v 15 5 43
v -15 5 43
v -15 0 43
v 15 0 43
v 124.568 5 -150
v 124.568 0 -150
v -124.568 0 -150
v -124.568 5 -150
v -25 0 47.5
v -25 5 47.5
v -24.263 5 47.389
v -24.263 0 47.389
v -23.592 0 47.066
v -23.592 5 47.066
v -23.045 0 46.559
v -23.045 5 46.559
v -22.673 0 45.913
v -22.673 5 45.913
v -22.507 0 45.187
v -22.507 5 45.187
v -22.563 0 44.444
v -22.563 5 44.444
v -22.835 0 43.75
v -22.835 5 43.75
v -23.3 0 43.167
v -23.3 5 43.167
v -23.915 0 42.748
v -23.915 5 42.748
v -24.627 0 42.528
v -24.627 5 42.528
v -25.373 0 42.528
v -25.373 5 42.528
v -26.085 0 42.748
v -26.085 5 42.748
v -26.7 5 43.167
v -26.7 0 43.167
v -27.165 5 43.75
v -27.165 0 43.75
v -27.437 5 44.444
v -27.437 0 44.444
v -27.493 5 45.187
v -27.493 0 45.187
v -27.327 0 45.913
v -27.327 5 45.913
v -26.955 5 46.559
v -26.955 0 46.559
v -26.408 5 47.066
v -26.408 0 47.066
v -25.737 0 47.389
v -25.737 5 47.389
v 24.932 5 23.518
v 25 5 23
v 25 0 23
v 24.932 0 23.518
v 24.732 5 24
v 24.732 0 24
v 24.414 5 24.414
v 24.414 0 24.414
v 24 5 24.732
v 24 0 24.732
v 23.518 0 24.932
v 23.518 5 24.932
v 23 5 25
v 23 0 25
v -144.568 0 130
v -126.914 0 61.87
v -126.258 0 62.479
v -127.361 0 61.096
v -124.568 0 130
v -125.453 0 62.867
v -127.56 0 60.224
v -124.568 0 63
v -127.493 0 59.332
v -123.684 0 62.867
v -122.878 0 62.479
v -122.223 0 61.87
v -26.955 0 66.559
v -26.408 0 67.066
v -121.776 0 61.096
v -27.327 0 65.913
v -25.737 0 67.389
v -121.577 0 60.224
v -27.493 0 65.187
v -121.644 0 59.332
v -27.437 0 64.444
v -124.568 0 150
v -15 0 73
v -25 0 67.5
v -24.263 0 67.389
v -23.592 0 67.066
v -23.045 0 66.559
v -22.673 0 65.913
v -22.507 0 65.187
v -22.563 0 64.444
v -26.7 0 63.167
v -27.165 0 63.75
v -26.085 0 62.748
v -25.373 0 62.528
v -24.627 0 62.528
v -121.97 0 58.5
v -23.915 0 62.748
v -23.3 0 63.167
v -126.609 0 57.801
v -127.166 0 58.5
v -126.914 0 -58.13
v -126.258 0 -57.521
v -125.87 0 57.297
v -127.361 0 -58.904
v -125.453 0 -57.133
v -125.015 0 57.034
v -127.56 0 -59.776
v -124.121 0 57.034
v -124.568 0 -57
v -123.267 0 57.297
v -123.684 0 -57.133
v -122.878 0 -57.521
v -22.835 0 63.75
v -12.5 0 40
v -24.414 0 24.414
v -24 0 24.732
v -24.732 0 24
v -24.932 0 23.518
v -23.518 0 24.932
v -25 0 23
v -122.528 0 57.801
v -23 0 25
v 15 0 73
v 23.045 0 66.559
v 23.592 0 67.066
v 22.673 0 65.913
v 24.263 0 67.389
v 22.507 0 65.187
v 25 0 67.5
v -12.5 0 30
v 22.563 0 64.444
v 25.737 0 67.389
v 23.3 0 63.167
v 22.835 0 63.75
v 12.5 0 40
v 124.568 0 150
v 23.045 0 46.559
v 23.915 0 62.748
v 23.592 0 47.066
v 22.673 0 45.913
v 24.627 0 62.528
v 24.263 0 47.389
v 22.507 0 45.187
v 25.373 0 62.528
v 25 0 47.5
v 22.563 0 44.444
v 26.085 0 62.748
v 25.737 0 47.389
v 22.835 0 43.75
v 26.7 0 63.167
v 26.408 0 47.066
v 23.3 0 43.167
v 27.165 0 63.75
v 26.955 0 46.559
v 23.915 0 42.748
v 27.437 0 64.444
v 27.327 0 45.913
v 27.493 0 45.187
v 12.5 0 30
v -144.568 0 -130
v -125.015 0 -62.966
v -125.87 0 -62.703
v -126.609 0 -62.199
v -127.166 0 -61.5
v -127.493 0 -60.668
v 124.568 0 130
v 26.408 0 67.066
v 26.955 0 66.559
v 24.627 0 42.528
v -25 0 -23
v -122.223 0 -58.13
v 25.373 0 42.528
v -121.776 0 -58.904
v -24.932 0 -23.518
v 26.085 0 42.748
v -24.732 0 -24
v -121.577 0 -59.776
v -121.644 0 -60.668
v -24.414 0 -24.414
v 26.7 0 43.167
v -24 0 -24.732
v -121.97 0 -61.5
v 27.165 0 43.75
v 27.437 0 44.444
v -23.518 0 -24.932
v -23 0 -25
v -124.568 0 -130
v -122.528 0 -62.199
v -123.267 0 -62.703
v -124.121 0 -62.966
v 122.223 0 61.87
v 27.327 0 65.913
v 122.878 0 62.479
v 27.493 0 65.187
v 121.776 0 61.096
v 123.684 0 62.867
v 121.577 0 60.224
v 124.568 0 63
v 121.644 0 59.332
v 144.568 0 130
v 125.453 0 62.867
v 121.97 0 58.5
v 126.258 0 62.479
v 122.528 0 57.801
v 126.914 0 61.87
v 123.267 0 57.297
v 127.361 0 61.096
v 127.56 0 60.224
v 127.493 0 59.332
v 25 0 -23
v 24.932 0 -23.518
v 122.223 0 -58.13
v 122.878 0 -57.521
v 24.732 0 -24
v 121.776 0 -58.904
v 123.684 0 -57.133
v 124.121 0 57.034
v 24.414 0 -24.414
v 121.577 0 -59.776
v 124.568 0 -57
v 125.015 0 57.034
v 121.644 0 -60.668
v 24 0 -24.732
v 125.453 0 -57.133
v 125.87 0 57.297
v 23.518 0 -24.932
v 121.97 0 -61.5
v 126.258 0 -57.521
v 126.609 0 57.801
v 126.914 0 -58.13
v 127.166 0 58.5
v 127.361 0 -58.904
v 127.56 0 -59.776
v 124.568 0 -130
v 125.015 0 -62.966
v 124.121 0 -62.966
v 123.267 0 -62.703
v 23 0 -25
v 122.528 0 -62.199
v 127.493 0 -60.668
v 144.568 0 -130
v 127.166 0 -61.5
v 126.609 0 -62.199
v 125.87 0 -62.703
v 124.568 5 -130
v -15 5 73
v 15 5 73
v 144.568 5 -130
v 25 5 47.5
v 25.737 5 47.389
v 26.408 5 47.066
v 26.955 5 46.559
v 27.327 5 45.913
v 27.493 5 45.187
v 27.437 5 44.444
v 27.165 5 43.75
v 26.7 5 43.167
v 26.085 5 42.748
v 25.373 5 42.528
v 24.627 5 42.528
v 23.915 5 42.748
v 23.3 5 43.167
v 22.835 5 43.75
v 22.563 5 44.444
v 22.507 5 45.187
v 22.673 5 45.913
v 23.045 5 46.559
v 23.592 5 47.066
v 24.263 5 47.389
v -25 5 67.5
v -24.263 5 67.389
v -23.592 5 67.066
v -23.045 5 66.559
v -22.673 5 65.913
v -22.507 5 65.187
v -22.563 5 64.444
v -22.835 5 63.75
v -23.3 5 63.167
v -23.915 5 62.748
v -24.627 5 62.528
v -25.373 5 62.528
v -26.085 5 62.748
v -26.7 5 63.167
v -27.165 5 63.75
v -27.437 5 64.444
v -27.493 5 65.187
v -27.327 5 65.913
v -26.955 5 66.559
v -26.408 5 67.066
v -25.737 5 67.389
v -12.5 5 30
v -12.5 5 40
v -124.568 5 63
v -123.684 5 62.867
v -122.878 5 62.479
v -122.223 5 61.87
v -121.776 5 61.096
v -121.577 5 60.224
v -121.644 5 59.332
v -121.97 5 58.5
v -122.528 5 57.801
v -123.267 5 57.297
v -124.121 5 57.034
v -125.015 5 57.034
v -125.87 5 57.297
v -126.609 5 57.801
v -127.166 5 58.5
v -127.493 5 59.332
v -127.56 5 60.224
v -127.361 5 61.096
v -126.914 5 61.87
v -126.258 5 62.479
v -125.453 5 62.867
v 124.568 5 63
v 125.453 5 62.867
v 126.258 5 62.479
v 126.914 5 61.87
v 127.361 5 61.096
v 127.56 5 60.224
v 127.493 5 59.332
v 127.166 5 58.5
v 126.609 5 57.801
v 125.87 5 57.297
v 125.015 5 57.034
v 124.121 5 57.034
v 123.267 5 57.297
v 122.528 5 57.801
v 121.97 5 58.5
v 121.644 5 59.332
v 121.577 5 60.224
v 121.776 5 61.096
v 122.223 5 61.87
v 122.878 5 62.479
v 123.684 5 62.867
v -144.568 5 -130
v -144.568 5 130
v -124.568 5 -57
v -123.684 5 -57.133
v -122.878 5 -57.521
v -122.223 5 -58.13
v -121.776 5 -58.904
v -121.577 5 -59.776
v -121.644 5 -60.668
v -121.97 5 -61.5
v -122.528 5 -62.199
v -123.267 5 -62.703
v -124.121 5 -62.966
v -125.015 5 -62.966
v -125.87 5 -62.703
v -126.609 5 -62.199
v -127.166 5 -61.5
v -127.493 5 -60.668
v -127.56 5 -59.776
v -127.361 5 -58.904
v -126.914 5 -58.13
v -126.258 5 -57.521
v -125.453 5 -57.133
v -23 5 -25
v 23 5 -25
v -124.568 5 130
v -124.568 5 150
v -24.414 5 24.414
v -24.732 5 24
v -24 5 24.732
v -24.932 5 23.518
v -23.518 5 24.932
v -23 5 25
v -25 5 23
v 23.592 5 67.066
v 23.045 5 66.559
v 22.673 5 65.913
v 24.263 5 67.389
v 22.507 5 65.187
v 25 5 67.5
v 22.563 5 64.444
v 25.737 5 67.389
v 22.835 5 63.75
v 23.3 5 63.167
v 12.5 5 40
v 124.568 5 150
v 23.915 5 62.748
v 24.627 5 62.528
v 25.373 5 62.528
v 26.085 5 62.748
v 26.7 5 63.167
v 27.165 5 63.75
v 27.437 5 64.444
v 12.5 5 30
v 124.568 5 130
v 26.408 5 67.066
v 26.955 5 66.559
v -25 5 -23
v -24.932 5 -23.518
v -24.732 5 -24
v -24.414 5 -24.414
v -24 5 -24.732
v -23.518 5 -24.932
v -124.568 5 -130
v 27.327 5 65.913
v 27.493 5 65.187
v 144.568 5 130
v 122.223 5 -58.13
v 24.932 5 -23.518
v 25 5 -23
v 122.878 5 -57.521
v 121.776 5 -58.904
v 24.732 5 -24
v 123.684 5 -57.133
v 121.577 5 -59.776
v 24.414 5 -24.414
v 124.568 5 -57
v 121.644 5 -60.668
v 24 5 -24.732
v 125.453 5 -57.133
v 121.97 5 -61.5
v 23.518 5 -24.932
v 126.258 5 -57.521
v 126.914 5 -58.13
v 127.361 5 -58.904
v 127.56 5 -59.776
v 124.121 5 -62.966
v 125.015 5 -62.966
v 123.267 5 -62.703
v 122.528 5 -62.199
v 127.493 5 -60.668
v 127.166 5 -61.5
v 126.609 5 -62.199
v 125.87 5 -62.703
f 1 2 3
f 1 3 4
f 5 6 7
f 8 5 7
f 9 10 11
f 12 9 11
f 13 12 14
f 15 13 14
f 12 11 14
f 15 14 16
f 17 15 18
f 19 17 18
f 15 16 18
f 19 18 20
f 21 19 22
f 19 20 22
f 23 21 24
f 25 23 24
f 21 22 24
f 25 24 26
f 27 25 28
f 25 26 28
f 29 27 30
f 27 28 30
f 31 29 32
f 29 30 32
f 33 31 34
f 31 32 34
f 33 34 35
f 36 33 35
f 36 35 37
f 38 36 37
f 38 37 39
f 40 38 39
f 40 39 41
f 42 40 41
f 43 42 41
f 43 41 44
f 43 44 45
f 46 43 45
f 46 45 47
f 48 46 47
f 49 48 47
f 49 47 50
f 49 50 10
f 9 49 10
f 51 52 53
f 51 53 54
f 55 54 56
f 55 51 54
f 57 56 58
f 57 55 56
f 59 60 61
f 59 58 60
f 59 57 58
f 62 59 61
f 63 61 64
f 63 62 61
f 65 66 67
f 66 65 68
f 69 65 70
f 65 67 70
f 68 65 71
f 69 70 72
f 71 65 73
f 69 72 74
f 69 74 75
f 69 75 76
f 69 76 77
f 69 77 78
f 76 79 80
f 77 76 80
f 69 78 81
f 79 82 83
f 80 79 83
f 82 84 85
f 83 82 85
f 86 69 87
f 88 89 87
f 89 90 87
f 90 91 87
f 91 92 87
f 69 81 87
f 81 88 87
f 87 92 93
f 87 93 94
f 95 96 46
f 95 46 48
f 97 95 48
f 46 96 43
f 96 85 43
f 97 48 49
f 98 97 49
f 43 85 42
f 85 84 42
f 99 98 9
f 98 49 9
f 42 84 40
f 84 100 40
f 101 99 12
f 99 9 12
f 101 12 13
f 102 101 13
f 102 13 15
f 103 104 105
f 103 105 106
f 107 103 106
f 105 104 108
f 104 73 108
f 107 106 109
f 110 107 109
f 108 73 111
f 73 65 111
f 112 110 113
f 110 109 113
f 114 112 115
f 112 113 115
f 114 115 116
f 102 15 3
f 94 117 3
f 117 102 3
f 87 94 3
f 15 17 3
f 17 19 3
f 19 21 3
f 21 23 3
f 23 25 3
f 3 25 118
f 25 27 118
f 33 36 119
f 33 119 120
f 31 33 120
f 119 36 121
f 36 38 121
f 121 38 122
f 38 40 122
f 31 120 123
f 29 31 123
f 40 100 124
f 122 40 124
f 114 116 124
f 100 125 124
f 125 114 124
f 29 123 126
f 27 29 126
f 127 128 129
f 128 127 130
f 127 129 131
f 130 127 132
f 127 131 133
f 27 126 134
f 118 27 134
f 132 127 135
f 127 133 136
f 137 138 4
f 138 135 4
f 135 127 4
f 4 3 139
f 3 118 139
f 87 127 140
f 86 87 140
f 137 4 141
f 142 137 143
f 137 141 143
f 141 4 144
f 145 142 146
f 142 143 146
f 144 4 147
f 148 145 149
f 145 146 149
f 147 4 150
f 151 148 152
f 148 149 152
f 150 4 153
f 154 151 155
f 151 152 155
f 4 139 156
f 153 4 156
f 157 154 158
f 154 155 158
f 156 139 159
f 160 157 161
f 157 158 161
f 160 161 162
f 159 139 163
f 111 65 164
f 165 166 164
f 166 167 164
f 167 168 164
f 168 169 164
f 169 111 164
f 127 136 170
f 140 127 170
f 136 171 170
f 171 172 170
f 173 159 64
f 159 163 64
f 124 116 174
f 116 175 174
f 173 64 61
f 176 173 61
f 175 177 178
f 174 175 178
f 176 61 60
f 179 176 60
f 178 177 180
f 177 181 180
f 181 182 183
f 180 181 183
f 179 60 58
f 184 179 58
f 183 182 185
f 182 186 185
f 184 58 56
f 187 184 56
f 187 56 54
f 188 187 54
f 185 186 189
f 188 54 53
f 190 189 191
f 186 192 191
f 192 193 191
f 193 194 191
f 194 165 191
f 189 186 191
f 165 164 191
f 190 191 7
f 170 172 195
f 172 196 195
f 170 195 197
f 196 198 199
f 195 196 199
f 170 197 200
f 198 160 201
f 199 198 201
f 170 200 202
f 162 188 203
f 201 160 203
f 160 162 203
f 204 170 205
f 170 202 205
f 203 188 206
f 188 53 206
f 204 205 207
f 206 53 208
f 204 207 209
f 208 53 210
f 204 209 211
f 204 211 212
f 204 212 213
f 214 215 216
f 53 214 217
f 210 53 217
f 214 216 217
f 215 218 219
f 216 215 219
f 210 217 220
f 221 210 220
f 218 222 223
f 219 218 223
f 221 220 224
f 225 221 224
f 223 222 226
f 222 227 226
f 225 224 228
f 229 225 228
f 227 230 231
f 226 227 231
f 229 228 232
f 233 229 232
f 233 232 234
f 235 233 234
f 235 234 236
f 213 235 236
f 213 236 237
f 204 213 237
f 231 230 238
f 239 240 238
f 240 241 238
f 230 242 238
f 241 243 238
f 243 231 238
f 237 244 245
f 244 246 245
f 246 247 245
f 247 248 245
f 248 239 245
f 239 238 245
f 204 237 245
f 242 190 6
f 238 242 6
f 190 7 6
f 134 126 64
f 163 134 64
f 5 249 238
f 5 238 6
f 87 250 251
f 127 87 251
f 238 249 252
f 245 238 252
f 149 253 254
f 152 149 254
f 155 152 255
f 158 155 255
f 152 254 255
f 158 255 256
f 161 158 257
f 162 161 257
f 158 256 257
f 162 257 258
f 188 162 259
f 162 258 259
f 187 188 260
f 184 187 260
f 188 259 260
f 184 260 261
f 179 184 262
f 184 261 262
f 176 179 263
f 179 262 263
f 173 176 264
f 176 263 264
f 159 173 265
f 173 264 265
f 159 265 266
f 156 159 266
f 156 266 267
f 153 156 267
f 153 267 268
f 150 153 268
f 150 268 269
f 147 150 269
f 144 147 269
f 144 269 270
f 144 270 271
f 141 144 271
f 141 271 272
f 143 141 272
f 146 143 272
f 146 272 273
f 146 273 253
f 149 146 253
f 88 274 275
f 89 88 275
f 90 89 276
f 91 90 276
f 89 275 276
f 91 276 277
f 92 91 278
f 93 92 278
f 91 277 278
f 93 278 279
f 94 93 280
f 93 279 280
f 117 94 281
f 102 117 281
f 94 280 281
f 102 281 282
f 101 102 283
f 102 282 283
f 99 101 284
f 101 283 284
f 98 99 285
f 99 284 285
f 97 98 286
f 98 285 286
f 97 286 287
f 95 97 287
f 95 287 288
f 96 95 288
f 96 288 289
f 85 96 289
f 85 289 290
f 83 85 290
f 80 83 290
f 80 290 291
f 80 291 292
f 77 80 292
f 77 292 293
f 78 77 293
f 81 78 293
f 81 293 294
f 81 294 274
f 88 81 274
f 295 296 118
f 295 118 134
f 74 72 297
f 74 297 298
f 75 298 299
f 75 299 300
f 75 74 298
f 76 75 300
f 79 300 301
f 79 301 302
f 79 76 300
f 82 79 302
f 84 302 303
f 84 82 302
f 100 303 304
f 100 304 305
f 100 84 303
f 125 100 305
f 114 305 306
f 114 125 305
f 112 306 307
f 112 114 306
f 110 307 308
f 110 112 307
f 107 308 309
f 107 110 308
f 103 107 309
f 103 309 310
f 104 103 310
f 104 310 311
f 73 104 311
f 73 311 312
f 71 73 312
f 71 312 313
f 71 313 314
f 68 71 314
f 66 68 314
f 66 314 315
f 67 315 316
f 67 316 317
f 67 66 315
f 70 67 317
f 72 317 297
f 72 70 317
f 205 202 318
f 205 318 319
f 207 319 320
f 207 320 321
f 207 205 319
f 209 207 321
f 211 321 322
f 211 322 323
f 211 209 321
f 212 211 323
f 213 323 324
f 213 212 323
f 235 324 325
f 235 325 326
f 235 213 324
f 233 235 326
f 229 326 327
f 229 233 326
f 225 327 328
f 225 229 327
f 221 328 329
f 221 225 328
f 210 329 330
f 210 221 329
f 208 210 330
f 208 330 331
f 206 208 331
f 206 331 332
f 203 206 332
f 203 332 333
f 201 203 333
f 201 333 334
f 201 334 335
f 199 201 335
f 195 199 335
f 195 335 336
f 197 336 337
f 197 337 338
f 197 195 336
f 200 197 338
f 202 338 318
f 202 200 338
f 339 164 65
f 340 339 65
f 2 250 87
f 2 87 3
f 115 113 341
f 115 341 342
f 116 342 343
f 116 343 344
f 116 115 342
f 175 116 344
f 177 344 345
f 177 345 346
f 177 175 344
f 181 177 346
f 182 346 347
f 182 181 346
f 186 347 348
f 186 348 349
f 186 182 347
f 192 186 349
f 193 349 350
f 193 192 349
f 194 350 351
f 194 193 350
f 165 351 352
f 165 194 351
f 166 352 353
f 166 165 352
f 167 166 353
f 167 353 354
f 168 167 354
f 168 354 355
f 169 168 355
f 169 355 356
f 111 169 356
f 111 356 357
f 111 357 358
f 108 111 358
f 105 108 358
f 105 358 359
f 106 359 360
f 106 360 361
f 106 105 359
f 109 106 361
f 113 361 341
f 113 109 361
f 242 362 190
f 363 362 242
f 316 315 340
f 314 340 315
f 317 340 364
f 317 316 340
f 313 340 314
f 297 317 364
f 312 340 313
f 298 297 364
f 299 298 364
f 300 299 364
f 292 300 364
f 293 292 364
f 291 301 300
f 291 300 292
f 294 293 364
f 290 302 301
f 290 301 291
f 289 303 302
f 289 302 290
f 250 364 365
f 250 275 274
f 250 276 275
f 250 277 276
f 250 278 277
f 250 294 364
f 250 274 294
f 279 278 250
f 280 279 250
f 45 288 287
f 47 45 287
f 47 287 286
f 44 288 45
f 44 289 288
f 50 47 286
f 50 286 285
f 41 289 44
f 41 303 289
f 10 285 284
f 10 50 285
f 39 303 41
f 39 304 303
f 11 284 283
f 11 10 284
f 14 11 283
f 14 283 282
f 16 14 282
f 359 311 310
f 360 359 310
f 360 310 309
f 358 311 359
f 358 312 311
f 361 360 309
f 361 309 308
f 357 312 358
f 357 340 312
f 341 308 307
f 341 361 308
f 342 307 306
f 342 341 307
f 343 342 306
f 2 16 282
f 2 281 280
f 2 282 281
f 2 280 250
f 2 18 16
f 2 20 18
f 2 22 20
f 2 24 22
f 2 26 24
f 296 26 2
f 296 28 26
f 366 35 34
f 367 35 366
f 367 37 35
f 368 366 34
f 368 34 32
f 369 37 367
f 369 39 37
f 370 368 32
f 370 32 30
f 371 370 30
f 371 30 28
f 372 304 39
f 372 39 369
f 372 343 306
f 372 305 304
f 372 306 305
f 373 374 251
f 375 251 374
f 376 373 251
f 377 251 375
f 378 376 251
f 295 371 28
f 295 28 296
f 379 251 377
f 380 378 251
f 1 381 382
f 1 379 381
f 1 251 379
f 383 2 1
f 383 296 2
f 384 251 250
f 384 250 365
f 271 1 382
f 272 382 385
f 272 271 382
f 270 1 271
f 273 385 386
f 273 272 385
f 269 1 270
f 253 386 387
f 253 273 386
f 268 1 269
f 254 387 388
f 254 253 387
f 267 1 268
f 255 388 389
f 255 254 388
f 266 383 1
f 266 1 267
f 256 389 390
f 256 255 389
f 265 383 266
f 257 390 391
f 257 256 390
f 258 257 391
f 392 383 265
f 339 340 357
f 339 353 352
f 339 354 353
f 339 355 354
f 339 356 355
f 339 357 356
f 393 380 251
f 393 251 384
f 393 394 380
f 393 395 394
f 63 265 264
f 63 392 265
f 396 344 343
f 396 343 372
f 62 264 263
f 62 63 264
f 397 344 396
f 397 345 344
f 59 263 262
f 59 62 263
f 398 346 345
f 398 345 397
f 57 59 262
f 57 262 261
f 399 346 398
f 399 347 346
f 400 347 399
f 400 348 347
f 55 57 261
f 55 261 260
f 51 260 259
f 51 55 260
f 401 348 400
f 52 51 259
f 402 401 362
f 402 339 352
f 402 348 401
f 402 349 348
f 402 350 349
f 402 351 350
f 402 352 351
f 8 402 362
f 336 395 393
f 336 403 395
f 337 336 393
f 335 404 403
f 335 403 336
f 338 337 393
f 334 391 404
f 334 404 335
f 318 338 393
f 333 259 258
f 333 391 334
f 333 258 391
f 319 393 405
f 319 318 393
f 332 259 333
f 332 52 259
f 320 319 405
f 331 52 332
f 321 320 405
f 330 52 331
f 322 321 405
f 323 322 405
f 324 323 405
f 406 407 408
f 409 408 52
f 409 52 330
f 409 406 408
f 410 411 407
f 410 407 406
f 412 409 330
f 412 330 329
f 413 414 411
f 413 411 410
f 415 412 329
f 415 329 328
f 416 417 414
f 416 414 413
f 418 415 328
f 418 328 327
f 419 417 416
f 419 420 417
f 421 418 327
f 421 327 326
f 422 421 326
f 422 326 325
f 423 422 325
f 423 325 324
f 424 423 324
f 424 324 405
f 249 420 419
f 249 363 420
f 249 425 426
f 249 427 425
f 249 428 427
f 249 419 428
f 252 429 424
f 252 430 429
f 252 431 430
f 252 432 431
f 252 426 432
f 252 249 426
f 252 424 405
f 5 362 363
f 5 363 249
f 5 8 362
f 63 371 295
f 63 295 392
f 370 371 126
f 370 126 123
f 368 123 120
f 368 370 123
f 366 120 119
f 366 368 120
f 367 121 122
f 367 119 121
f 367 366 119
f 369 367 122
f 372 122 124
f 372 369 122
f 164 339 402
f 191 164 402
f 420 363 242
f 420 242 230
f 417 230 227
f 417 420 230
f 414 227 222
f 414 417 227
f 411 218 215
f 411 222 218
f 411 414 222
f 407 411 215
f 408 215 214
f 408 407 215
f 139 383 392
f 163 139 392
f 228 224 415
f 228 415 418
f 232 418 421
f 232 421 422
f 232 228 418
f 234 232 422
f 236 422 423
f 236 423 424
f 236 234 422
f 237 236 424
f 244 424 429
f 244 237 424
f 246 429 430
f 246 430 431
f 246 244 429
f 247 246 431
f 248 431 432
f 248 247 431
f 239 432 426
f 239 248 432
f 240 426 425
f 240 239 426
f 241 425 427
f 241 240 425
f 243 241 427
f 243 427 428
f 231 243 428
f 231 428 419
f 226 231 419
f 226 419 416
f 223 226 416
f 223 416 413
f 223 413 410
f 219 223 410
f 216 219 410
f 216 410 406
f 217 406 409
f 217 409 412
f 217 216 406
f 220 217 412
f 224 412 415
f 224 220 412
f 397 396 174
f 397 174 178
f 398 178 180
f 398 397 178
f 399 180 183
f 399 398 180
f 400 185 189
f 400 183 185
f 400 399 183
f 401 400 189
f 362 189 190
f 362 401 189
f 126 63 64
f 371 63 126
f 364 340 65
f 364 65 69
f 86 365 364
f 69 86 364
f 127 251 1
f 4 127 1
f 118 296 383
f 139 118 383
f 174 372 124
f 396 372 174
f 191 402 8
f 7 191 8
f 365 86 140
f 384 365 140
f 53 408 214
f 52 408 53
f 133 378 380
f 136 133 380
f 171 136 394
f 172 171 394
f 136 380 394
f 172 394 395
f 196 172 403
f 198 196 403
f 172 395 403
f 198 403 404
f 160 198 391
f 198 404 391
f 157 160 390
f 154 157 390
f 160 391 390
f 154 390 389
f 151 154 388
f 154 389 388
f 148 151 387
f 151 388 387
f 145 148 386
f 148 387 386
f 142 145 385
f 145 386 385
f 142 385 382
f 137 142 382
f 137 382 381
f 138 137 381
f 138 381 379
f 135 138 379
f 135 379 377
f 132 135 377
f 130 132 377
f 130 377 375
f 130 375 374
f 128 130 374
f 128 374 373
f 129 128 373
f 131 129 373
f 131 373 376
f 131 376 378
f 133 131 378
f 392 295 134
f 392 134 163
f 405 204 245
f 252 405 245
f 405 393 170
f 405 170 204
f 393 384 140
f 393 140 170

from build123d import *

# Parameters (mm, degrees)
ESQUISSE1_W             = 40
ESQUISSE1_H             = 80
ESQUISSE1_R             = 3
BOSS_EXTRU_1_DEPTH      = 5
ESQUISSE2_R             = 2.5
ESQUISSE2_W             = 30
ESQUISSE2_H             = 30
ESQUISSE2_W_2           = 25
ESQUISSE2_H_2           = 10
ENL_V_MAT_EXTRU_1_DEPTH = 209.386659842
ESQUISSE4_W             = 20
ESQUISSE4_H             = 20
ENL_V_MAT_EXTRU_2_DEPTH = 10


with BuildPart() as part:
    # Esquisse1 → Boss.-Extru.1 (new body)
    # profile 1 of 7: a face of its own
    with BuildSketch(Plane(origin=(0, 0, 0), x_dir=(1, 0, 0), z_dir=(0, 1, 0))):
        with BuildLine():
            ThreePointArc((4.38e-07, -150), (-90.829510449, -119.373363996), (-144.568322948, -40))
            Line((-144.568322948, -40), (-144.568322948, -150))
            Line((-144.568322948, -150), (4.38e-07, -150))
        make_face()
    # profile 2 of 7: a face of its own
    with BuildSketch(Plane(origin=(0, 0, 0), x_dir=(1, 0, 0), z_dir=(0, 1, 0))):
        with BuildLine():
            ThreePointArc((144.568322948, -40), (90.829510797, -119.373363731), (4.38e-07, -150))
            Line((4.38e-07, -150), (144.568322948, -150))
            Line((144.568322948, -150), (144.568322948, -40))
        make_face()
    # profile 3 of 7: a face of its own
    with BuildSketch(Plane(origin=(0, 0, 0), x_dir=(1, 0, 0), z_dir=(0, 1, 0))):
        with Locations((124.568322948, 0)):
            Rectangle(ESQUISSE1_W, ESQUISSE1_H)
    # profile 4 of 7: a face of its own
    with BuildSketch(Plane(origin=(0, 0, 0), x_dir=(1, 0, 0), z_dir=(0, 1, 0))):
        with BuildLine():
            ThreePointArc((2.28e-07, 150), (-90.829510532, 119.373363932), (-144.568322948, 40))
            Line((-144.568322948, 40), (-104.568322948, 40))
            Line((-104.568322948, 40), (-104.568322948, -40))
            Line((-104.568322948, -40), (-144.568322948, -40))
            ThreePointArc((-144.568322948, -40), (-90.829510449, -119.373363996), (4.38e-07, -150))
            ThreePointArc((4.38e-07, -150), (90.829510797, -119.373363731), (144.568322948, -40))
            Line((144.568322948, -40), (104.568322948, -40))
            Line((104.568322948, -40), (104.568322948, 40))
            Line((104.568322948, 40), (144.568322948, 40))
            ThreePointArc((144.568322948, 40), (90.829510714, 119.373363794), (2.28e-07, 150))
        make_face()
        with Locations(Location((-124.568322948, -60, 0), (0, 0, 270))):
            Circle(ESQUISSE1_R, mode=Mode.SUBTRACT)
        with Locations(Location((124.568322948, -60, 0), (0, 0, 270))):
            Circle(ESQUISSE1_R, mode=Mode.SUBTRACT)
        with Locations(Location((-124.568322948, 60, 0), (0, 0, 270))):
            Circle(ESQUISSE1_R, mode=Mode.SUBTRACT)
        with Locations(Location((124.568322948, 60, 0), (0, 0, 270))):
            Circle(ESQUISSE1_R, mode=Mode.SUBTRACT)
    # profile 5 of 7: a face of its own
    with BuildSketch(Plane(origin=(0, 0, 0), x_dir=(1, 0, 0), z_dir=(0, 1, 0))):
        with Locations((-124.568322948, 0)):
            Rectangle(ESQUISSE1_W, ESQUISSE1_H)
    # profile 6 of 7: a face of its own
    with BuildSketch(Plane(origin=(0, 0, 0), x_dir=(1, 0, 0), z_dir=(0, 1, 0))):
        with BuildLine():
            Line((-144.568322948, 150), (-144.568322948, 40))
            ThreePointArc((-144.568322948, 40), (-90.829510532, 119.373363932), (2.28e-07, 150))
            Line((2.28e-07, 150), (-144.568322948, 150))
        make_face()
    # profile 7 of 7: a face of its own
    with BuildSketch(Plane(origin=(0, 0, 0), x_dir=(1, 0, 0), z_dir=(0, 1, 0))):
        with BuildLine():
            Line((144.568322948, 150), (2.28e-07, 150))
            ThreePointArc((2.28e-07, 150), (90.829510714, 119.373363794), (144.568322948, 40))
            Line((144.568322948, 40), (144.568322948, 150))
        make_face()
    extrude(amount=BOSS_EXTRU_1_DEPTH)

    # Esquisse2 → Enlèv. mat.-Extru.1 (cut, through all)
    with BuildSketch(Plane(origin=(0, 5, 0), x_dir=(1, 0, 0), z_dir=(0, 1, 0))):
        with Locations(Location((25, -45, 0), (0, 0, 270))):
            Circle(ESQUISSE2_R)
        with Locations(Location((25, -65, 0), (0, 0, 270))):
            Circle(ESQUISSE2_R)
        with Locations(Location((-25, -45, 0), (0, 0, 270))):
            Circle(ESQUISSE2_R)
        with Locations(Location((-25, -65, 0), (0, 0, 270))):
            Circle(ESQUISSE2_R)
        with BuildLine():
            Line((23, -25), (-23, -25))
            ThreePointArc((-23, -25), (-24.414213562, -24.414213562), (-25, -23))
            Line((-25, -23), (-25, 23))
            ThreePointArc((-25, 23), (-24.414213562, 24.414213562), (-23, 25))
            Line((-23, 25), (23, 25))
            ThreePointArc((23, 25), (24.414213562, 24.414213562), (25, 23))
            Line((25, 23), (25, -23))
            ThreePointArc((25, -23), (24.414213562, -24.414213562), (23, -25))
        make_face()
        with Locations((0, -58)):
            Rectangle(ESQUISSE2_W, ESQUISSE2_H)
        with Locations((0, -35)):
            Rectangle(ESQUISSE2_W_2, ESQUISSE2_H_2)
    extrude(amount=-ENL_V_MAT_EXTRU_1_DEPTH, mode=Mode.SUBTRACT)

    # Esquisse4 → Enlèv. mat.-Extru.2 (cut)
    with BuildSketch(Plane(origin=(0, 5, 0), x_dir=(1, 0, 0), z_dir=(0, 1, 0))):
        with Locations((-134.568322948, 140)):
            Rectangle(ESQUISSE4_W, ESQUISSE4_H)
        with Locations((134.568322948, 140)):
            Rectangle(ESQUISSE4_W, ESQUISSE4_H)
        with Locations((134.568322948, -140)):
            Rectangle(ESQUISSE4_W, ESQUISSE4_H)
        with Locations((-134.568322948, -140)):
            Rectangle(ESQUISSE4_W, ESQUISSE4_H)
    extrude(amount=-ENL_V_MAT_EXTRU_2_DEPTH, mode=Mode.SUBTRACT)


solid = part.part
